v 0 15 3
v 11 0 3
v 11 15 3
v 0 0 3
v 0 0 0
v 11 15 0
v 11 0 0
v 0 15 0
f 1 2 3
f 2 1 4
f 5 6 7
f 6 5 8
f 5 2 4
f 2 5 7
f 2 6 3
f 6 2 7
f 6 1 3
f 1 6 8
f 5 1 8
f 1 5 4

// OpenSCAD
// Generated by SolidPython 1.0.1 on 2020-07-29 00:46:55


cube(size = [11, 15, 3]);
/***********************************************
*********      SolidPython code:      **********
************************************************
 
# import packages: SolidPython
from solid import *
from solid.utils import *
from itertools import chain, combinations, permutations


class Resize:

    def __init__(self, scad_file):
        self.scad_file = scad_file
        #self.scad_file = import_scad(scad_file)
        # cone/cylinder param:
        self.r1 = 0
        self.r2 = 0
        self.h = 0
        # rectangular prism param:
        self.w = 0
        self.l = 0
        # ellipse param:
        self.r = 0

    # import OpenScad code (file name corresponds to shape)


    # classify shape + parameters
    def assign(self, param1, param2, param3):
        if self.scad_file == 'cone.scad':
            self.r1 = param1
            self.r2 = param2
            self.h = param3
        elif self.scad_file == 'cylinder.scad':
            self.r1 = param1
            self.r2 = param2
            self.h = param3
        elif self.scad_file == 'rectangularPrism.scad':
            self.h = param1
            self.l = param2
            self.w = param3
        else:
            self.r = param1
            self.h = param2

    # resize parameters
    def iterate(self):
        x = range(3, 20, 2)
        i = 1
        if self.scad_file == 'cone.scad':
            tempList = list(permutations(x, 2))
            for temp in tempList:
                param1 = temp[0]
                param2 = temp[1]
                filepath = 'produced_scad_files/' + 'cone' + str(param1) + '_' + str(param2) + '_' + '.scad'
                scad_render_to_file(cylinder(h=param1, r1=param2, r2=0), filepath)

        elif self.scad_file == 'cylinder.scad':
            tempList = list(permutations(x, 3))
            for temp in tempList:
                param1 = temp[0]
                param2 = temp[1]
                filepath = 'produced_scad_files/' + 'cylinder' + str(param1) + '_' + str(param2) + '_' + '.scad'
                scad_render_to_file(cylinder(h=param1, r1=param2, r2=param2), filepath)

        elif self.scad_file == 'rectangularPrism.scad':
            tempList = list(permutations(x, 3))
            for temp in tempList:
                param1 = temp[0]
                param2 = temp[1]
                param3 = temp[2]
                filepath = 'produced_scad_files/' + 'rectangularPrism' + str(param1) + '_' + str(param2) + '_' + str(
                    param3) + '.scad'
                scad_render_to_file(cube(size=(param1, param2, param3)), filepath)

        elif self.scad_file == 'ellipse.scad':
            tempList = list(permutations(x, 4))
            for temp in tempList:
                param1 = temp[0]
                param2 = temp[1]
                param3 = temp[2]
                param4 = temp[3]
                filepath = 'produced_scad_files/' + 'ellipse' + str(param1) + '_' + str(param2) + '_' + str(param3) + '_' + str(param4) + '.scad'
                scad_render_to_file(scale([param1, param2, param3])(sphere(r=param4)), filepath)

    def render_to_scadfile(self):
        scad_render_to_file(scad, 'example.scad') 
 
************************************************/
